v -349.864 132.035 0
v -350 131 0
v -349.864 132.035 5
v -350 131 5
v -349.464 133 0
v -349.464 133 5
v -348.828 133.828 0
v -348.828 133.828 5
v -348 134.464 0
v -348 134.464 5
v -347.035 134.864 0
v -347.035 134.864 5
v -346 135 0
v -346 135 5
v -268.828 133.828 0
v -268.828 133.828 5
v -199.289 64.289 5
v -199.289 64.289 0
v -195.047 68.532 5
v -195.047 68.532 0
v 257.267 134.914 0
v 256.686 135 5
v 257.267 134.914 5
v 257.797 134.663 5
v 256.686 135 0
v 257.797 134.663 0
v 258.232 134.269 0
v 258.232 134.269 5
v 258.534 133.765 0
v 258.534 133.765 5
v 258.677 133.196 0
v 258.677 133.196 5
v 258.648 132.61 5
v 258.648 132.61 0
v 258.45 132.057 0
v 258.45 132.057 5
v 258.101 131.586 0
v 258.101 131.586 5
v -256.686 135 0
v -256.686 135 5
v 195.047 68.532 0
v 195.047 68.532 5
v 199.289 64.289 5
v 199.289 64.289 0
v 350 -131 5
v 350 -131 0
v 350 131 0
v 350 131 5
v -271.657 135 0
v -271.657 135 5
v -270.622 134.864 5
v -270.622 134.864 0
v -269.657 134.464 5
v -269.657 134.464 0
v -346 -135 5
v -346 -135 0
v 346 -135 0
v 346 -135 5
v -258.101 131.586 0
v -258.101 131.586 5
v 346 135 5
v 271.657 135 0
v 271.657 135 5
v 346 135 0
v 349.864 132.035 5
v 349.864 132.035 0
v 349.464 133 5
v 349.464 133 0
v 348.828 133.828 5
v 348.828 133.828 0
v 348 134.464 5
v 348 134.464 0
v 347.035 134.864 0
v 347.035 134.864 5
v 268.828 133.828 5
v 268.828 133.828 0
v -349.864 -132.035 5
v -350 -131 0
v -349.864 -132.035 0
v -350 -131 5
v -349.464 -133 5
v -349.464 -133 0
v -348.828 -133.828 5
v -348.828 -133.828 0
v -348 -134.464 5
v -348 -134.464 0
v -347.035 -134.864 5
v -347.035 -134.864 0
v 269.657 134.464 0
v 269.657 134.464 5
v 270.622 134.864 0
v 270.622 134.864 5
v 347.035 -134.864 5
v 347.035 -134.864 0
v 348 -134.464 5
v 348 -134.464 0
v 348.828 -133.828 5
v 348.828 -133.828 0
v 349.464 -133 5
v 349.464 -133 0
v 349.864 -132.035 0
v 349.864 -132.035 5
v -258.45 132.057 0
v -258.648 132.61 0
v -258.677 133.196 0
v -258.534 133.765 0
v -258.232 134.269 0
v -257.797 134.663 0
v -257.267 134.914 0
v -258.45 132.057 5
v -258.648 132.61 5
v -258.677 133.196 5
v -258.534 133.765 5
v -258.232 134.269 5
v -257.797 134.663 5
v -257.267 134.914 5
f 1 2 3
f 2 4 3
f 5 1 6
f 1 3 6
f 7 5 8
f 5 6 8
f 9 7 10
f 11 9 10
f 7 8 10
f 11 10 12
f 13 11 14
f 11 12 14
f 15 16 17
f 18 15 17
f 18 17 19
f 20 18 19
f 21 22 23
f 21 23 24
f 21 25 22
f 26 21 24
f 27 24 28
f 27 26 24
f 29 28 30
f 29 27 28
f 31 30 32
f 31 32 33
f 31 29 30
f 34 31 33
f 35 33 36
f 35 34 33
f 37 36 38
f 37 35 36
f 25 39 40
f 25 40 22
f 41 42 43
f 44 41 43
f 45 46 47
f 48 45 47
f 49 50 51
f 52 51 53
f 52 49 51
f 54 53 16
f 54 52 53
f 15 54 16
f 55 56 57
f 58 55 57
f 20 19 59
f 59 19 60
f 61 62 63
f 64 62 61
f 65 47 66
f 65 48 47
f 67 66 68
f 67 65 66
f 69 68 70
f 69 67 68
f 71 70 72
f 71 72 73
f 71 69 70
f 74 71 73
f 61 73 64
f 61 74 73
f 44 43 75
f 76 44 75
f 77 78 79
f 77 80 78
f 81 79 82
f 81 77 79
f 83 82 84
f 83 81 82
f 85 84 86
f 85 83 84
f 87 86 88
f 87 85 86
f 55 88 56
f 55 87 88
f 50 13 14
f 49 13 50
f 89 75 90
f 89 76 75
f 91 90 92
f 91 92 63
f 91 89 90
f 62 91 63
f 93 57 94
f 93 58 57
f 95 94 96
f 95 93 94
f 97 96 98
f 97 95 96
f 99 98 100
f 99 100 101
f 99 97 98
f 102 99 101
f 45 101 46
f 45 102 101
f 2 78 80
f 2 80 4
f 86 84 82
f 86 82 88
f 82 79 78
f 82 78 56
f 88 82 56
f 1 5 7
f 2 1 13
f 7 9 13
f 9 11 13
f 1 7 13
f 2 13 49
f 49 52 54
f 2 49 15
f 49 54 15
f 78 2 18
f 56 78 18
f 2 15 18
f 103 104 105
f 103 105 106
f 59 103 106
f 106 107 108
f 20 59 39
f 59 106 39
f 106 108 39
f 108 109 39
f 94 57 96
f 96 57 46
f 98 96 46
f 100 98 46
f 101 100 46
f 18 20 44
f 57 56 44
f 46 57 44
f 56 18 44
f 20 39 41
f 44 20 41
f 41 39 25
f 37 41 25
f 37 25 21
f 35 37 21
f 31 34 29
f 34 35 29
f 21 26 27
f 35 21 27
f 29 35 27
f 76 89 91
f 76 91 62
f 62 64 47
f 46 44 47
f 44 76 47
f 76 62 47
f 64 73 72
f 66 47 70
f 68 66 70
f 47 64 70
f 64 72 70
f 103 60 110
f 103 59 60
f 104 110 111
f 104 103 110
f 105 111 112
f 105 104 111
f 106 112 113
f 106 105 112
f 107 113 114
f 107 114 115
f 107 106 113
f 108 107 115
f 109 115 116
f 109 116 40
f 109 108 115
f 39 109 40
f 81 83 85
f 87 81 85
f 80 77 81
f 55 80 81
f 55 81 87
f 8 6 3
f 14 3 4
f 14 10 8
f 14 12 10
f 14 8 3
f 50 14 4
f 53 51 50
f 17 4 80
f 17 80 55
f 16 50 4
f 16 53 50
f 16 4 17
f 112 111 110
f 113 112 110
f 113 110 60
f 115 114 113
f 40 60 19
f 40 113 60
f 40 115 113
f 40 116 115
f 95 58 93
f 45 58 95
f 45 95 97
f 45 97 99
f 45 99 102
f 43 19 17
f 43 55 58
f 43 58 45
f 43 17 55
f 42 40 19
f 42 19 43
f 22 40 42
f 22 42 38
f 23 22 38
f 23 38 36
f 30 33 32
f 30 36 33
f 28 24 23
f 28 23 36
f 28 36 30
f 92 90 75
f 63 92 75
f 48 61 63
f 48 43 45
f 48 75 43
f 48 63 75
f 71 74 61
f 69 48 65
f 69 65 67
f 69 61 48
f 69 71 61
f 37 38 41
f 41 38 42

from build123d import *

# Parameters (mm, degrees)
F0_W     = 700
F0_H     = 270
F1_DEPTH = 5
F3_DEPTH = 25
F4_R     = 4
F5_R     = 2


with BuildPart() as f1:
    # F0 (on Top) → F1 (new body)
    with BuildSketch(Plane.XY):
        Rectangle(F0_W, F0_H)
    extrude(amount=F1_DEPTH)

    # F2 (on face) → F3 (cut)
    with BuildSketch(Plane.XY.offset(5)):
        Polygon((-261.5147186258, 135), (-270, 135), (-199.2893218813, 64.2893218813), (-195.0466811942, 68.5319625685), align=None)
        Polygon((270, 135), (261.5147186258, 135), (195.0466811942, 68.5319625685), (199.2893218813, 64.2893218813), align=None)
    extrude(amount=-F3_DEPTH, mode=Mode.SUBTRACT)

    # F4
    f4_edges = [f1.edges().sort_by_distance(p)[0] for p in [
        (-350, -135, 2.5),
        (350, -135, 2.5),
        (350, 135, 2.5),
        (-350, 135, 2.5),
        (-270, 135, 2.5),
        (270, 135, 2.5),
    ]]
    fillet(f4_edges, radius=F4_R)

    # F5
    f5_edges = [f1.edges().sort_by_distance(p)[0] for p in [
        (261.514719, 135, 2.5),
        (-261.514719, 135, 2.5),
    ]]
    fillet(f5_edges, radius=F5_R)


solid = f1.part
